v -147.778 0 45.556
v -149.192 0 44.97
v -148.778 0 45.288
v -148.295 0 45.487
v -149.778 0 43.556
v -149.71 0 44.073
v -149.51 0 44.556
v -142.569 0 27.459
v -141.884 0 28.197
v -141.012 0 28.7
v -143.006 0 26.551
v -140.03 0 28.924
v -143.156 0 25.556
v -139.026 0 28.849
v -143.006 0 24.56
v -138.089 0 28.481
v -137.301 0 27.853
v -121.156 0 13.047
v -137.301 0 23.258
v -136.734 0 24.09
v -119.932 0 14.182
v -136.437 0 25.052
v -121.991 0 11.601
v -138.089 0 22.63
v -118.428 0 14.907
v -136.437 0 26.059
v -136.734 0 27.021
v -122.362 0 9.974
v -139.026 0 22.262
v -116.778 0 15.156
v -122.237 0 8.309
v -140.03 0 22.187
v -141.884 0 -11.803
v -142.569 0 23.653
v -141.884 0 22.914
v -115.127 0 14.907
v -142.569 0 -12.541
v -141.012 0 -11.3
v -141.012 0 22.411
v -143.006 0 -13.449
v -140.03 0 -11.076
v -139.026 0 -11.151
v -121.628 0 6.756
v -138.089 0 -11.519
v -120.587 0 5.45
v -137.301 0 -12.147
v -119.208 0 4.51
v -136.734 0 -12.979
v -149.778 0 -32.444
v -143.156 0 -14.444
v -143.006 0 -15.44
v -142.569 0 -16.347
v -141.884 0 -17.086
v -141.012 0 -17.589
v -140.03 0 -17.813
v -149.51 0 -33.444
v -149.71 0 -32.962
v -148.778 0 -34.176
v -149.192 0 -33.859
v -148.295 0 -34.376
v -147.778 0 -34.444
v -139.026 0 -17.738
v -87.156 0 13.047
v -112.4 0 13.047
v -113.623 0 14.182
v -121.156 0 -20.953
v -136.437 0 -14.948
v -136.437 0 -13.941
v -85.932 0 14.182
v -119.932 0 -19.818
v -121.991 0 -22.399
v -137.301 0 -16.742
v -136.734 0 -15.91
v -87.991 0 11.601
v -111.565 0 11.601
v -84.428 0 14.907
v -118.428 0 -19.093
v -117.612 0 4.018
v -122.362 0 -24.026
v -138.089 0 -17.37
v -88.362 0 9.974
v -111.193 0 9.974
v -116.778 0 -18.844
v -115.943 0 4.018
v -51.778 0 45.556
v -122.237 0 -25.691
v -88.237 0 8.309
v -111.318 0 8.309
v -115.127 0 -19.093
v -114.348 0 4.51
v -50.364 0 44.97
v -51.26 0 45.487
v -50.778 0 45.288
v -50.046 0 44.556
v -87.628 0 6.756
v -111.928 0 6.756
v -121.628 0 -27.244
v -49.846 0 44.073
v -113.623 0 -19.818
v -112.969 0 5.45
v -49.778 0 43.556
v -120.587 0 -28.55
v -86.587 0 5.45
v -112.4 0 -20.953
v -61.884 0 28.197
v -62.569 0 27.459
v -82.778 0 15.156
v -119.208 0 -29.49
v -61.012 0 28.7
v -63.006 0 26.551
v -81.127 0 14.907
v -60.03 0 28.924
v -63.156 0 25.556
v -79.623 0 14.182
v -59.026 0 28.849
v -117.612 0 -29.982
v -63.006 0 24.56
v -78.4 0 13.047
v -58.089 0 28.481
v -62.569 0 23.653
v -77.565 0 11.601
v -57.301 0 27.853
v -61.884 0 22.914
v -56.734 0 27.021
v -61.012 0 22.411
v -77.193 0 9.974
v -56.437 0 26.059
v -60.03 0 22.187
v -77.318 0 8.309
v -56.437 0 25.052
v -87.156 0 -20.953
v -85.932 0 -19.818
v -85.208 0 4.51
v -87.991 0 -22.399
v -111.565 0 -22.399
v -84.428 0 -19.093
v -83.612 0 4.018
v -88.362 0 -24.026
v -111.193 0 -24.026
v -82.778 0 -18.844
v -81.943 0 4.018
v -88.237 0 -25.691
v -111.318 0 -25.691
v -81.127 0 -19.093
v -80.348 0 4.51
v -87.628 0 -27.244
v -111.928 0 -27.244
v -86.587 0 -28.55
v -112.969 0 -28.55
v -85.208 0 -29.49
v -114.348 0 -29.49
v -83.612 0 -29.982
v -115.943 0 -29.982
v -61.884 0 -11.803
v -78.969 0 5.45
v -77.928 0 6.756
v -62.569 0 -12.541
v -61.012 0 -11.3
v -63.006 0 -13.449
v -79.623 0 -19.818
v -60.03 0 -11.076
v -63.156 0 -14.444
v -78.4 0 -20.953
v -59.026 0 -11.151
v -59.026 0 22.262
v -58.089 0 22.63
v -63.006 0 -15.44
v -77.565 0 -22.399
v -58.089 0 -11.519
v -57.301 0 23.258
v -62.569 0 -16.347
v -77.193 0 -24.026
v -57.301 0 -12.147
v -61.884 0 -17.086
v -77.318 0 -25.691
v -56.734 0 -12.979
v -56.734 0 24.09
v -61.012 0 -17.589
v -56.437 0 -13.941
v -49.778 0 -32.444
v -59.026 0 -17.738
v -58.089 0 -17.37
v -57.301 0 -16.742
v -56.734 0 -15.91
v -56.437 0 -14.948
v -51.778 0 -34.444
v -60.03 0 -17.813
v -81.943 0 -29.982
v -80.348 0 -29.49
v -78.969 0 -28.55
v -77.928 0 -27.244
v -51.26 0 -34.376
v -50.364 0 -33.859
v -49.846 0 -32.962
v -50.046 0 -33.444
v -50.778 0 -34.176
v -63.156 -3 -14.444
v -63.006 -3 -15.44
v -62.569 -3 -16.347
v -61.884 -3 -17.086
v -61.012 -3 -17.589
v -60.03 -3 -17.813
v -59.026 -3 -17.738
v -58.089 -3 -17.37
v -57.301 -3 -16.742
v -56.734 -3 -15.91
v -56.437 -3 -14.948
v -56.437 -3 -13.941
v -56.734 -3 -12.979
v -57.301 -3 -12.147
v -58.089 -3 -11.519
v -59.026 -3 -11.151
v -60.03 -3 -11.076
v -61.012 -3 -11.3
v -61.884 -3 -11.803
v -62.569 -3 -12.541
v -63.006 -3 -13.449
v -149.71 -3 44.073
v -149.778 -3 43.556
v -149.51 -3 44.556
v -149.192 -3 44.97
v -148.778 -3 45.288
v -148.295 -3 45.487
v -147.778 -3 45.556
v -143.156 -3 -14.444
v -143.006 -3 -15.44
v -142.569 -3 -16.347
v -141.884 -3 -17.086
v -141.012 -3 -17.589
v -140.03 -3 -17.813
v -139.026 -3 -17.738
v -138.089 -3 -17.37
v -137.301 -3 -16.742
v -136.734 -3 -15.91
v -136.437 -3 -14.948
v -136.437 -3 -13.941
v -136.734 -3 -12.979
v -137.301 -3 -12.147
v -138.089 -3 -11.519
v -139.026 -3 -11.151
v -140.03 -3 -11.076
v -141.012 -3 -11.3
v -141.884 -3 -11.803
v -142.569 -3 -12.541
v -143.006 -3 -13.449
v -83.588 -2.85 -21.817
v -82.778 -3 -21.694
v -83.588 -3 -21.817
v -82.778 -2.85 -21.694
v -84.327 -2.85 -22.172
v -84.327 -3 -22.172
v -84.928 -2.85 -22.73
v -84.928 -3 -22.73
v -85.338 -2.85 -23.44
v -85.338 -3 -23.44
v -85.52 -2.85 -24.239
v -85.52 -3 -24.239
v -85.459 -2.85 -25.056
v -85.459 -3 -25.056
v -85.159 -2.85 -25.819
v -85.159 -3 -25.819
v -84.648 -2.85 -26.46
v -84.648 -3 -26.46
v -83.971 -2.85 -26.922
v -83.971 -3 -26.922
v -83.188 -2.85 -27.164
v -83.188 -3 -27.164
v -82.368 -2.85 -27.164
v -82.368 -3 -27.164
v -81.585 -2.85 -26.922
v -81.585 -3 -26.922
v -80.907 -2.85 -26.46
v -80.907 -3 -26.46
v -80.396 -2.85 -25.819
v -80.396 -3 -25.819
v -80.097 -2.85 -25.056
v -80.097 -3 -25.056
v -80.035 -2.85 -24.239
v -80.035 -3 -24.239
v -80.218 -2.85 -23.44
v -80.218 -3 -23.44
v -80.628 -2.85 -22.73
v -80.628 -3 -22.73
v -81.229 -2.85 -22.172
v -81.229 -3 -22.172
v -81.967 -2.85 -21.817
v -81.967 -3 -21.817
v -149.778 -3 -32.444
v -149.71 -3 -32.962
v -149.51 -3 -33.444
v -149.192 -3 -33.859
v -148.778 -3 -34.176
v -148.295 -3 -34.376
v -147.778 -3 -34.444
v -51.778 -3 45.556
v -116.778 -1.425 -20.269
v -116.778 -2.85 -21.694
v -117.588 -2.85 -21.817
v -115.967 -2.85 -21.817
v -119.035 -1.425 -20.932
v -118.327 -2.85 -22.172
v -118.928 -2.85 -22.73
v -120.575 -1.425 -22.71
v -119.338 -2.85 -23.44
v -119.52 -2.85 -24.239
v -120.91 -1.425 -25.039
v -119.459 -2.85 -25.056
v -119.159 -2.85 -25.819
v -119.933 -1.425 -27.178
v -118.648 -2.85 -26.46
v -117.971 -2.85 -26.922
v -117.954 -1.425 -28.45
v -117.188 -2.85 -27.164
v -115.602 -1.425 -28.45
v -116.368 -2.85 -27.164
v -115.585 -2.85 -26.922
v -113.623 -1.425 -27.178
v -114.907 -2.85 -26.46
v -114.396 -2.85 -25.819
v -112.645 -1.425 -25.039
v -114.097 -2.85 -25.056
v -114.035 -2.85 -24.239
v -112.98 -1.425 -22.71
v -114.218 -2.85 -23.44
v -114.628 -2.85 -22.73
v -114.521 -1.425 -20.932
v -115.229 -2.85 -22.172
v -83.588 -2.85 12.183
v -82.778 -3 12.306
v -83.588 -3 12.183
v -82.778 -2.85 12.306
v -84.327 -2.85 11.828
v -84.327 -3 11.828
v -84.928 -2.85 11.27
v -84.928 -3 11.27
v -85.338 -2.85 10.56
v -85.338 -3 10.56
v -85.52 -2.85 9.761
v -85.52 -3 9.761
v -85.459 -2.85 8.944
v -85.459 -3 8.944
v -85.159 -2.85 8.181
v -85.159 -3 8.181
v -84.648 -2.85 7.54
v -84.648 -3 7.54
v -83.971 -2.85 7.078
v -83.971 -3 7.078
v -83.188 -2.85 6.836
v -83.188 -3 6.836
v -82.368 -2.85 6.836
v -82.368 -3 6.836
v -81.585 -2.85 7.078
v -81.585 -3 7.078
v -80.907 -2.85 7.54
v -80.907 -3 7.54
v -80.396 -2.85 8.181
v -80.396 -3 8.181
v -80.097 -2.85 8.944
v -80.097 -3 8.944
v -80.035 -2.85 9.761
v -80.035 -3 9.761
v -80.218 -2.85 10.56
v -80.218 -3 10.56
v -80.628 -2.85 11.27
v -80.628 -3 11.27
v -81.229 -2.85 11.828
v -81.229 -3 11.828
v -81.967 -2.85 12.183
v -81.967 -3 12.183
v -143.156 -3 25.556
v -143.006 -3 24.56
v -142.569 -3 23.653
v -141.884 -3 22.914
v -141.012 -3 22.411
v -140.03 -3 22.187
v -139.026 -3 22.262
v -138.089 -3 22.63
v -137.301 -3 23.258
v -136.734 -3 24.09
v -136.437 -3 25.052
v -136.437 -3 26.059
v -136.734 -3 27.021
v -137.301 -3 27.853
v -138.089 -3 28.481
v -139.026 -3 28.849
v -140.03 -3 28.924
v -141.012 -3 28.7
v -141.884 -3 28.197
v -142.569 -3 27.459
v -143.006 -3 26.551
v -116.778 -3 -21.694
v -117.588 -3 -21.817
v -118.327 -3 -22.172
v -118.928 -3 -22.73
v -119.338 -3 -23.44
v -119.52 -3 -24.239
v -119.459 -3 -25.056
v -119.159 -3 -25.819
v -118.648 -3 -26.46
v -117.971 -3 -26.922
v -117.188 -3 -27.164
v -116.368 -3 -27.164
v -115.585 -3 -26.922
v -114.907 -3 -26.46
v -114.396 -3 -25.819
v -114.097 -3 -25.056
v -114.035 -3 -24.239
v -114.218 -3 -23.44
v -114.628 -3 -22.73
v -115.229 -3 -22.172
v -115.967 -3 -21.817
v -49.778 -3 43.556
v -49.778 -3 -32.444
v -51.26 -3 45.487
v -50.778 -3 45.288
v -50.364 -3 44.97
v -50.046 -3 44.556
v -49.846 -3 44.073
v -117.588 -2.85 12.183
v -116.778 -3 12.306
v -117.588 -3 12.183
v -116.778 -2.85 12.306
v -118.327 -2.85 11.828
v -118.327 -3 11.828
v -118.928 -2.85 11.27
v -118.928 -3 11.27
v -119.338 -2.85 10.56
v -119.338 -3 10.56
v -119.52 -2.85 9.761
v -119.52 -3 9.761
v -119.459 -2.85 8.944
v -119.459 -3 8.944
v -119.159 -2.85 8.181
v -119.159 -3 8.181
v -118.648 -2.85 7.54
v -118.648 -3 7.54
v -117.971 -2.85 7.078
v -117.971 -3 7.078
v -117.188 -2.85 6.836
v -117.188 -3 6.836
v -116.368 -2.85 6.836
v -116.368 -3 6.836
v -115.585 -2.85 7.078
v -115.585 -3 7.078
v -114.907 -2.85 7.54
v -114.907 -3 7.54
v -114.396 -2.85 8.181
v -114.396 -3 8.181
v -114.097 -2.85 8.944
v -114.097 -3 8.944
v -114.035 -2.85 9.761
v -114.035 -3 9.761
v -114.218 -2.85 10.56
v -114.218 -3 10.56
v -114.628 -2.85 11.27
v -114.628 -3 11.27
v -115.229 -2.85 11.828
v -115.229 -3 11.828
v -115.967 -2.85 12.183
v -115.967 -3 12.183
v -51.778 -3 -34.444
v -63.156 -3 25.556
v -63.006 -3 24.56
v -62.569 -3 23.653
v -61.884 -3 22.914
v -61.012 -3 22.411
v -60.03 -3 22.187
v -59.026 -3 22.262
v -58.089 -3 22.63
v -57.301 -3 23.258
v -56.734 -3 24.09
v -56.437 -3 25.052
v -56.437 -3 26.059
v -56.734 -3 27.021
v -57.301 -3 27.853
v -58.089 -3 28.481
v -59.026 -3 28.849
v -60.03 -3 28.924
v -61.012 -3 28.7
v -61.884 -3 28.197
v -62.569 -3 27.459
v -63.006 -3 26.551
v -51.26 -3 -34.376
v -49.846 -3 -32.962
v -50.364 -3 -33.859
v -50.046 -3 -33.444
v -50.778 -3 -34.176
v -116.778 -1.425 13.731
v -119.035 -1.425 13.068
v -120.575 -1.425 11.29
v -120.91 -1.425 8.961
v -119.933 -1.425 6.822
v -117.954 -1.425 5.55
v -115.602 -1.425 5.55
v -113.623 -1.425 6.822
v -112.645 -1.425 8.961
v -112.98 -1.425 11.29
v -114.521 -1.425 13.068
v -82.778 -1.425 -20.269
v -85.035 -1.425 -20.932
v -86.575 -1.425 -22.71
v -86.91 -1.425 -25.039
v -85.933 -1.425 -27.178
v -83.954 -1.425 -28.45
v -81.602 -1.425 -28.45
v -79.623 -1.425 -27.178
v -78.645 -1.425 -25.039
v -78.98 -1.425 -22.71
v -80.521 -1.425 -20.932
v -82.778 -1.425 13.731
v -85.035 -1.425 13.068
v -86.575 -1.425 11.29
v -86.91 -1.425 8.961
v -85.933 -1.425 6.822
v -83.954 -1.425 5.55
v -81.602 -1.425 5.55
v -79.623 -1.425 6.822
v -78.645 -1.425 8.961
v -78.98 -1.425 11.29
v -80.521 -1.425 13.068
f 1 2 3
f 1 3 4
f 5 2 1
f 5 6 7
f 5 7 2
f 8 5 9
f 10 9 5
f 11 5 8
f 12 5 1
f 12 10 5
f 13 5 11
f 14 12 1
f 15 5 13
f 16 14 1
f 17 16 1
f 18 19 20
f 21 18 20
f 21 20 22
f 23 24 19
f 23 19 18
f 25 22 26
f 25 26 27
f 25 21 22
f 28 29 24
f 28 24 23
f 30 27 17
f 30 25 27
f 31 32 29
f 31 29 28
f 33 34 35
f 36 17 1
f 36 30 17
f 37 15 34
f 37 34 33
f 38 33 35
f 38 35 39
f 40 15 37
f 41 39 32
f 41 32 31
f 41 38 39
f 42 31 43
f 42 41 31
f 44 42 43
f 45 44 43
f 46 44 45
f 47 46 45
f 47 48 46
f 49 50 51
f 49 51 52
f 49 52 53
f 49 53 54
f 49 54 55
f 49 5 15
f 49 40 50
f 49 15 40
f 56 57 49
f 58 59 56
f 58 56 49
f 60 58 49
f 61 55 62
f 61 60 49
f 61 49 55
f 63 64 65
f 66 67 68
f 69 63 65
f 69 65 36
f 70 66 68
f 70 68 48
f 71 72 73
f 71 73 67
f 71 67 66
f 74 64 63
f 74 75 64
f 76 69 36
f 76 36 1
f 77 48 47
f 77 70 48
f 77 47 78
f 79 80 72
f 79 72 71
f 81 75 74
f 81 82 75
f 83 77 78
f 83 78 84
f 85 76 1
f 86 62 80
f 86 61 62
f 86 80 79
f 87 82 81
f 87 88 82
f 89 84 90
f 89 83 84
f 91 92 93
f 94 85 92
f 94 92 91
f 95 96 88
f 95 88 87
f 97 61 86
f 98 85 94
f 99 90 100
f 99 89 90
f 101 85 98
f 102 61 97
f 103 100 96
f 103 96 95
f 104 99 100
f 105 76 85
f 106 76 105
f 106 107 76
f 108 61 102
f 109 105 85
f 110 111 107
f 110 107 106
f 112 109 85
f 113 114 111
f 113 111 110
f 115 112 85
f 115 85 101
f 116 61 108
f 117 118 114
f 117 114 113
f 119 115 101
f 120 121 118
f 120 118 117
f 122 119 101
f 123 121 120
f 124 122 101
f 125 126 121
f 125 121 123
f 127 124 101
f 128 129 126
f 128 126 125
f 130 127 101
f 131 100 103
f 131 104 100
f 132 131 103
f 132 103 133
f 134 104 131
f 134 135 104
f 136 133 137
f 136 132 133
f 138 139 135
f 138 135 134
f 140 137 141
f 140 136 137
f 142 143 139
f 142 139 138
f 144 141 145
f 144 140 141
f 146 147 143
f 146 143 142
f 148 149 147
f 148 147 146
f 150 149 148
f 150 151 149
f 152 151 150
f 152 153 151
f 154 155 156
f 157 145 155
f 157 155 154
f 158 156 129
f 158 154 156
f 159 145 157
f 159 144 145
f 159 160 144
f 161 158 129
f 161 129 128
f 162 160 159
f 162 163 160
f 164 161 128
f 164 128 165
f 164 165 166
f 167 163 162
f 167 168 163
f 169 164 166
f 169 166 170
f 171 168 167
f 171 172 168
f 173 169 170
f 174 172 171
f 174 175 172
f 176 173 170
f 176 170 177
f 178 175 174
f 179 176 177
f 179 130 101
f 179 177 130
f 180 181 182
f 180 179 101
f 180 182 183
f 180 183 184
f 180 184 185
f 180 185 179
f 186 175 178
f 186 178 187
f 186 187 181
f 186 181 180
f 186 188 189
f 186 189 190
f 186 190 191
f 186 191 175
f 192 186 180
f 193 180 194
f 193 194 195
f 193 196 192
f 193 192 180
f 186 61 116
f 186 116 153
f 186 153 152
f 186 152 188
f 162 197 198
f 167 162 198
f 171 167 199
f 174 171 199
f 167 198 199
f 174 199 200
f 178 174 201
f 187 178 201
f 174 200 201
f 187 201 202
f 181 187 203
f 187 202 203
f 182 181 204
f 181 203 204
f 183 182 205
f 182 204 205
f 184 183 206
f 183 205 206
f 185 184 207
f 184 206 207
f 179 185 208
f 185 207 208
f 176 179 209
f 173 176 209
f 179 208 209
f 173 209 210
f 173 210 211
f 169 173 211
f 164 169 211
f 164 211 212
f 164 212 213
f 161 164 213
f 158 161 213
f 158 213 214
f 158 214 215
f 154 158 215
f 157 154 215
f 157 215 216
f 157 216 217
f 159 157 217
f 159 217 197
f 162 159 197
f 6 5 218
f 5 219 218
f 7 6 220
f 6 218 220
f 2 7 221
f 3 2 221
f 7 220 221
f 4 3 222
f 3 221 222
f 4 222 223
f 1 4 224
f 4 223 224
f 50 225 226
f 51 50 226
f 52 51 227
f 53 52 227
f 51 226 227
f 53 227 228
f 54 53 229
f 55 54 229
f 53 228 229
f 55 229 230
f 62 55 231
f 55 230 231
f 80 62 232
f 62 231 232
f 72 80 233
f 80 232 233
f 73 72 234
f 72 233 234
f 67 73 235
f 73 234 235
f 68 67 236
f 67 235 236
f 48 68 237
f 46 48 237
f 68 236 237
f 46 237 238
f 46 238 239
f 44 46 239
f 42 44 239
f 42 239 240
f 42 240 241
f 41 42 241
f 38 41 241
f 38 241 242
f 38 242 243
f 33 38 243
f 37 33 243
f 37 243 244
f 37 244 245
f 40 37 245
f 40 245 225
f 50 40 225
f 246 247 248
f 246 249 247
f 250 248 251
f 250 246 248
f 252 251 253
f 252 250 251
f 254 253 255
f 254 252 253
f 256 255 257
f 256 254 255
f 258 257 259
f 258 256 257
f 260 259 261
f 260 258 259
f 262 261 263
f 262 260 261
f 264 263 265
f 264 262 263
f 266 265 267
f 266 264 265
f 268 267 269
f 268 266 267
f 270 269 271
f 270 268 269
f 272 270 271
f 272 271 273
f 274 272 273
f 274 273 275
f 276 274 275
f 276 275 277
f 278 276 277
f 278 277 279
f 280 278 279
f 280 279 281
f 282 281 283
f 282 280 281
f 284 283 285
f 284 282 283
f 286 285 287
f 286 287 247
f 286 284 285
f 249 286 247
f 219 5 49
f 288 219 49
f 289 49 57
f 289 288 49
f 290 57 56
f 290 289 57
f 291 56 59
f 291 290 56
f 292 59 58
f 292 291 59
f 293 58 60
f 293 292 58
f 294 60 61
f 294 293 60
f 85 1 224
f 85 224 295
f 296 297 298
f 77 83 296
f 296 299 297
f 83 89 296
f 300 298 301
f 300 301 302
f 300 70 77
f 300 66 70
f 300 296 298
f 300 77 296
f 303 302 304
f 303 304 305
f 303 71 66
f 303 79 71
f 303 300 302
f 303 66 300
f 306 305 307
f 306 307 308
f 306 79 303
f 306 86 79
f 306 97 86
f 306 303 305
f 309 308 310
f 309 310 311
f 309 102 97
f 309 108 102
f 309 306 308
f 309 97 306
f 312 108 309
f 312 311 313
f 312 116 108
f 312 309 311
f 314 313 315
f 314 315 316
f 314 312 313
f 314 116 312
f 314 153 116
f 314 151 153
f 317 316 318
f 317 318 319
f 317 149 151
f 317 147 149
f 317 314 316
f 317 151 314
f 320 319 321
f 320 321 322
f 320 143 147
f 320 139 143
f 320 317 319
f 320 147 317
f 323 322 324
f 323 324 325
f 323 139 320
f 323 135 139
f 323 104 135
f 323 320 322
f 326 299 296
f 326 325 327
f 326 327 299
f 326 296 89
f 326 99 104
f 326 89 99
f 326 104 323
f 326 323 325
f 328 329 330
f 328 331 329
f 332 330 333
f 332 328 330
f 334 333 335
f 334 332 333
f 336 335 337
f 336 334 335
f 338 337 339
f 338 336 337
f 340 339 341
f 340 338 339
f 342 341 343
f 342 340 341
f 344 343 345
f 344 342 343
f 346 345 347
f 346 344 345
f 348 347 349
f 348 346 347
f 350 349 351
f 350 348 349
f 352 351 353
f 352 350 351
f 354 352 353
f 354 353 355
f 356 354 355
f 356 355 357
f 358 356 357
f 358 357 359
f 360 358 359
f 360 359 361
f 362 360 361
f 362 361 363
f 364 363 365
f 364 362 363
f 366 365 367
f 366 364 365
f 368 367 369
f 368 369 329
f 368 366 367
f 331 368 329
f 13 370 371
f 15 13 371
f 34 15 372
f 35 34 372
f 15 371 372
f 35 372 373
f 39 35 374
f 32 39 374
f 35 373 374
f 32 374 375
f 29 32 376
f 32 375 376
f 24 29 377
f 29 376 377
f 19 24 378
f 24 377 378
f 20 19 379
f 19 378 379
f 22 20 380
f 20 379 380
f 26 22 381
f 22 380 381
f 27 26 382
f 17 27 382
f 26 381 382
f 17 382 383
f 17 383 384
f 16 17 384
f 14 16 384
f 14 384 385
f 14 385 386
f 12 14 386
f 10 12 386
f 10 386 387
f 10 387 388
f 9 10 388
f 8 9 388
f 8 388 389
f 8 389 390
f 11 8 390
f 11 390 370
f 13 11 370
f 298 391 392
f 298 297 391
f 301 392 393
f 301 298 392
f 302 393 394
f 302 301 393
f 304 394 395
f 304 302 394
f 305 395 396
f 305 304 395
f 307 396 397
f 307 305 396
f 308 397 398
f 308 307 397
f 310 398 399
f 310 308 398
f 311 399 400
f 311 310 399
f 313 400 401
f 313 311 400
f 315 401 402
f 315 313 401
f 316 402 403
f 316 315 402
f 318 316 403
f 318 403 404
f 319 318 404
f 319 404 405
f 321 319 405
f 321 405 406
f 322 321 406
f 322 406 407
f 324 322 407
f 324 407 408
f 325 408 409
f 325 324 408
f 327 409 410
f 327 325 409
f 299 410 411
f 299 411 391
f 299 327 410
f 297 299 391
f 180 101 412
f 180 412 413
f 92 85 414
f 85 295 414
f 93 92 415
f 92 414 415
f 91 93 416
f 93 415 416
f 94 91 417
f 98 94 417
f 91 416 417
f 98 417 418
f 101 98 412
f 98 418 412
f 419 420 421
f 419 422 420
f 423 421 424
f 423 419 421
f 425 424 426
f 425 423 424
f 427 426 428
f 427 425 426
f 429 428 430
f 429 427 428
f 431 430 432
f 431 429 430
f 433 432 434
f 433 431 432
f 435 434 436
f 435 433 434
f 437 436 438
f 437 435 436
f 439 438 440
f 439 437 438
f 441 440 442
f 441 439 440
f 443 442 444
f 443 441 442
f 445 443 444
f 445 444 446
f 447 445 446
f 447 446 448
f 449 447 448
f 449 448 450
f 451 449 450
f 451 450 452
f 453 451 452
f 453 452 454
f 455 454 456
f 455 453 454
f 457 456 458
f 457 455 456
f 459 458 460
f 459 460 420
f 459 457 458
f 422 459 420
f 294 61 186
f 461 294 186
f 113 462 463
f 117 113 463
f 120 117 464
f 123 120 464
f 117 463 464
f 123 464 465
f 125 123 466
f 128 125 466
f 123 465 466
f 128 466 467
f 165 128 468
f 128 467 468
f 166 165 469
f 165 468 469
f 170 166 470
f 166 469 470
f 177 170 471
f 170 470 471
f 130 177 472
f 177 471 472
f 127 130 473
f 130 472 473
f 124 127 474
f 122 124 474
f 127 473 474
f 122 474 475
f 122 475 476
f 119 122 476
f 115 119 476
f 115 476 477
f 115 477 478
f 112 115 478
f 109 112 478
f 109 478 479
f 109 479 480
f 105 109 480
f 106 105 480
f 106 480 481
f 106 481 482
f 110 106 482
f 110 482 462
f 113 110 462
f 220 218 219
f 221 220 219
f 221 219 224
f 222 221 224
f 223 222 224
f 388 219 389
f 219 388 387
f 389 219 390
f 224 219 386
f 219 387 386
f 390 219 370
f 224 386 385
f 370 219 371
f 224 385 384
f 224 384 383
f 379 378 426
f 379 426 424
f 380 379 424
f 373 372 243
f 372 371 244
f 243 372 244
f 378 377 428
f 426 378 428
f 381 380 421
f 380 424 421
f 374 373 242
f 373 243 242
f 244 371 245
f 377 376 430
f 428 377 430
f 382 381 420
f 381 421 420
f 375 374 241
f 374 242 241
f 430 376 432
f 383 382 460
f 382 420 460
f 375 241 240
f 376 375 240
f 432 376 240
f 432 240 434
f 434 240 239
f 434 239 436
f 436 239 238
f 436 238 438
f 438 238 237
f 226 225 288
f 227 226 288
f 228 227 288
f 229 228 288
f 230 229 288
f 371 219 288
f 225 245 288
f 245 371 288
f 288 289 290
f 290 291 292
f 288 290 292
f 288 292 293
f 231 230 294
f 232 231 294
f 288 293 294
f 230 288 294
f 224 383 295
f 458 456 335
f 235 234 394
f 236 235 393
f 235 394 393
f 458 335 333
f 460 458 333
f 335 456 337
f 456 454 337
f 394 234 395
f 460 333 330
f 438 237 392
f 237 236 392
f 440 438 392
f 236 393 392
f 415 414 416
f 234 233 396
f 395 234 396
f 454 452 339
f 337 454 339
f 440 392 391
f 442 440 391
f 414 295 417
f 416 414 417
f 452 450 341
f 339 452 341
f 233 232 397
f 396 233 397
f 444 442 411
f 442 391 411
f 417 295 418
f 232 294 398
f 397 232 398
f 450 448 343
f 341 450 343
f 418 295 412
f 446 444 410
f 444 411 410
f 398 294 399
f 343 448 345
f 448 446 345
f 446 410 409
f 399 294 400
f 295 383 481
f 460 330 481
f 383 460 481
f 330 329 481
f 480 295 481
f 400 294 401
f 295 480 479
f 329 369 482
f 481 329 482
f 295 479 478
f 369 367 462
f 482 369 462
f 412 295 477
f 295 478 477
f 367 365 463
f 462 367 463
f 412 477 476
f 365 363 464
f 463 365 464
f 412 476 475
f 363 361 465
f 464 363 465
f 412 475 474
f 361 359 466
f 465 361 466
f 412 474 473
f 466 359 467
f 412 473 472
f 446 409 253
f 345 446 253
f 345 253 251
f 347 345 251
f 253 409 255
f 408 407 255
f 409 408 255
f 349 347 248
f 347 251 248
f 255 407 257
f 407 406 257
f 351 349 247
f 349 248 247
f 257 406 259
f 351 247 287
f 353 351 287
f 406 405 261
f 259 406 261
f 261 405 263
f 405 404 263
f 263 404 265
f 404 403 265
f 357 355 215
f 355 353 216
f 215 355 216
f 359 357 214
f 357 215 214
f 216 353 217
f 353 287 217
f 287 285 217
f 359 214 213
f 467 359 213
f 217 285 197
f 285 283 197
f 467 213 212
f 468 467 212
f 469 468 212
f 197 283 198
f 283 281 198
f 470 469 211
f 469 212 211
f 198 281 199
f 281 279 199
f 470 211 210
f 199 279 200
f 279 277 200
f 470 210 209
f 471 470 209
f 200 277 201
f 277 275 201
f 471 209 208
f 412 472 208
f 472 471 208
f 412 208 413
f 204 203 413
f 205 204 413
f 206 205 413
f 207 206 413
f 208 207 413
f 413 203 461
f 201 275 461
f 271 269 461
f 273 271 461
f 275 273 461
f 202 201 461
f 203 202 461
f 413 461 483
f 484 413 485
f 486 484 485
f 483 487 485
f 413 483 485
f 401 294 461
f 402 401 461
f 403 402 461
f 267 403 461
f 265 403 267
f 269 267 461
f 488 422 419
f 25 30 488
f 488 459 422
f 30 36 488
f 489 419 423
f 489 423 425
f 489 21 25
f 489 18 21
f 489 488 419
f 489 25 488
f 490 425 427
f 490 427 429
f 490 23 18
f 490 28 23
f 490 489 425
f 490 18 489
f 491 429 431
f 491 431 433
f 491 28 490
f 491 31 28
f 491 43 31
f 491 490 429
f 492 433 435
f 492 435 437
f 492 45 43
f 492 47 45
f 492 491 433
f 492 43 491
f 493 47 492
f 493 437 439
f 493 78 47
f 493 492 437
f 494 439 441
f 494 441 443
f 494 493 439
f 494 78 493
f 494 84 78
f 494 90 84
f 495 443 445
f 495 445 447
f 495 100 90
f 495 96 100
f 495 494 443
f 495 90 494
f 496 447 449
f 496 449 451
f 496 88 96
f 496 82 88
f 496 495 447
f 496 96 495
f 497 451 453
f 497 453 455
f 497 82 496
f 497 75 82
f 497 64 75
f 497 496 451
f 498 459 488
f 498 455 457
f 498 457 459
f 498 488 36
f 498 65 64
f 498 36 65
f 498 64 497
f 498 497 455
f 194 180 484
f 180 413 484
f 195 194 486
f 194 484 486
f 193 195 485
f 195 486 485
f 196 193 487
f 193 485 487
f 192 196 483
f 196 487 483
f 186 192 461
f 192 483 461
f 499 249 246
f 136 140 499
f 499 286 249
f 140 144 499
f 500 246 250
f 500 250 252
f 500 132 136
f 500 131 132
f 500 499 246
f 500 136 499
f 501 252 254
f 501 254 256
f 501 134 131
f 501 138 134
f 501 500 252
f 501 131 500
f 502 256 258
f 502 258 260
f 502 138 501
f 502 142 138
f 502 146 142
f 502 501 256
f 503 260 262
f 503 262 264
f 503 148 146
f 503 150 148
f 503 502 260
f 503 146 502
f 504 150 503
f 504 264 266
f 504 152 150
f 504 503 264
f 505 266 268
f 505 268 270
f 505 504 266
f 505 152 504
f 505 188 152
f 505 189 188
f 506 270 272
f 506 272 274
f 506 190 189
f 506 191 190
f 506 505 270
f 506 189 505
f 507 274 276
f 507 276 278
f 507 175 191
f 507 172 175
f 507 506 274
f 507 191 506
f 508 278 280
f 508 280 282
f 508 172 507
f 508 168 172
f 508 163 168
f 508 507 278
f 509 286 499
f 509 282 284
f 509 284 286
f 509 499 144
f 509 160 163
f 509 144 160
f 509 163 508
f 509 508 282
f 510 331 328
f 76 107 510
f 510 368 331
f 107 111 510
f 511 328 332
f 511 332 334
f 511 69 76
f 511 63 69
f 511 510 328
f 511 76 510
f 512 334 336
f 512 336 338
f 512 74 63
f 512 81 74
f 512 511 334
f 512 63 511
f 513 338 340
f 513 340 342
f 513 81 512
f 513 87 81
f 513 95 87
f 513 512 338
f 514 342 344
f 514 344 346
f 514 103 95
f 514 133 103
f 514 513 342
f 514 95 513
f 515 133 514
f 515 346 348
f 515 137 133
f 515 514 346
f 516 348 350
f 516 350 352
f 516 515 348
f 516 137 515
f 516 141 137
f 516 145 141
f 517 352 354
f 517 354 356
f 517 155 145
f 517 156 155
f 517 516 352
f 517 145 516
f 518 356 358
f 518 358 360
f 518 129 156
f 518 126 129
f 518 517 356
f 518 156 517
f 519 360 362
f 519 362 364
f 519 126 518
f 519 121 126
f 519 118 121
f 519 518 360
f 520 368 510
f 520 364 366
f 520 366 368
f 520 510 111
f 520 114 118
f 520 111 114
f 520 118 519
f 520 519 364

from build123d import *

# Parameters (mm, degrees)
CROQUIS1_W                                   = 100
CROQUIS1_H                                   = 80
BRIDA_BASE1_DEPTH                            = 3
REDONDEO1_R                                  = 2
TALADRO_DE_MARGEN_PARA_1_41_D                = 6.7564
REFRENTADO_PARA_TORNILLO_TAP_N_CON_C_2_COUNT = 2
REFRENTADO_PARA_TORNILLO_TAP_N_CON_C_2_PITCH = 34
REFRENTADO_PARA_TORNILLO_TAP_N_CON_C_3_COUNT = 2
REFRENTADO_PARA_TORNILLO_TAP_N_CON_C_3_PITCH = 48.083261121
REFRENTADO_PARA_TORNILLO_TAP_N_CON_C_4_COUNT = 2
REFRENTADO_PARA_TORNILLO_TAP_N_CON_C_4_PITCH = 34


# Sheet-metal steps are written as plain solids
with BuildPart() as part:
    # Croquis1 → Brida base1 (new body)
    with BuildSketch(Plane(origin=(0, 0, 0), x_dir=(1, 0, 0), z_dir=(0, 1, 0))):
        with Locations((-99.777777778, -5.555555556)):
            Rectangle(CROQUIS1_W, CROQUIS1_H)
    extrude(amount=-BRIDA_BASE1_DEPTH)

    # Redondeo1
    redondeo1_edges = [part.edges().sort_by_distance(p)[0] for p in [
        (-149.777777778, -1.5, -34.444444444),
        (-49.777777778, -1.5, -34.444444444),
        (-49.777777778, -1.5, 45.555555556),
        (-149.777777778, -1.5, 45.555555556),
    ]]
    fillet(redondeo1_edges, radius=REDONDEO1_R)

    # Taladro de margen para 1/41 (through all)
    with Locations(Plane(origin=(0, 0, 0), x_dir=(1, 0, 0), z_dir=(0, 1, 0))):
        with Locations((-139.777777778, -25.555555556), (-59.777777778, -25.555555556), (-139.777777778, 14.444444444), (-59.777777778, 14.444444444)):
            Hole(TALADRO_DE_MARGEN_PARA_1_41_D / 2)

    # Croquis9 → Refrentado para tornillo tapón con cabeza plana de clavija de M51 (revolve, cut)
    with BuildSketch(Plane(origin=(-116.777777778, 0, -24.444444444), x_dir=(0, 0, 1), z_dir=(1, 0, 0))):
        Polygon((0, 0), (0, 3), (2.75, 3), (2.75, 2.85), (5.6, 0), align=None)
    refrentado_para_tornillo_tap_n_con_cabez = revolve(axis=Axis((-116.777777778, 6.35, -24.444444444), (0, -1, 0)), mode=Mode.SUBTRACT)

    # Refrentado para tornillo tap_n con c 2: Refrentado para tornillo tapón con cabeza plana de clavija de M51 ×2
    with Locations(*[(i * REFRENTADO_PARA_TORNILLO_TAP_N_CON_C_2_PITCH, 0, 0) for i in range(1, REFRENTADO_PARA_TORNILLO_TAP_N_CON_C_2_COUNT)]):
        add(refrentado_para_tornillo_tap_n_con_cabez, mode=Mode.SUBTRACT)

    # Refrentado para tornillo tap_n con c 3: Refrentado para tornillo tapón con cabeza plana de clavija de M51 ×2
    with Locations(*[Vector(0.7071067811865476, 0, 0.7071067811865476) * (i * REFRENTADO_PARA_TORNILLO_TAP_N_CON_C_3_PITCH) for i in range(1, REFRENTADO_PARA_TORNILLO_TAP_N_CON_C_3_COUNT)]):
        add(refrentado_para_tornillo_tap_n_con_cabez, mode=Mode.SUBTRACT)

    # Refrentado para tornillo tap_n con c 4: Refrentado para tornillo tapón con cabeza plana de clavija de M51 ×2
    with Locations(*[(0, 0, i * REFRENTADO_PARA_TORNILLO_TAP_N_CON_C_4_PITCH) for i in range(1, REFRENTADO_PARA_TORNILLO_TAP_N_CON_C_4_COUNT)]):
        add(refrentado_para_tornillo_tap_n_con_cabez, mode=Mode.SUBTRACT)


solid = part.part
